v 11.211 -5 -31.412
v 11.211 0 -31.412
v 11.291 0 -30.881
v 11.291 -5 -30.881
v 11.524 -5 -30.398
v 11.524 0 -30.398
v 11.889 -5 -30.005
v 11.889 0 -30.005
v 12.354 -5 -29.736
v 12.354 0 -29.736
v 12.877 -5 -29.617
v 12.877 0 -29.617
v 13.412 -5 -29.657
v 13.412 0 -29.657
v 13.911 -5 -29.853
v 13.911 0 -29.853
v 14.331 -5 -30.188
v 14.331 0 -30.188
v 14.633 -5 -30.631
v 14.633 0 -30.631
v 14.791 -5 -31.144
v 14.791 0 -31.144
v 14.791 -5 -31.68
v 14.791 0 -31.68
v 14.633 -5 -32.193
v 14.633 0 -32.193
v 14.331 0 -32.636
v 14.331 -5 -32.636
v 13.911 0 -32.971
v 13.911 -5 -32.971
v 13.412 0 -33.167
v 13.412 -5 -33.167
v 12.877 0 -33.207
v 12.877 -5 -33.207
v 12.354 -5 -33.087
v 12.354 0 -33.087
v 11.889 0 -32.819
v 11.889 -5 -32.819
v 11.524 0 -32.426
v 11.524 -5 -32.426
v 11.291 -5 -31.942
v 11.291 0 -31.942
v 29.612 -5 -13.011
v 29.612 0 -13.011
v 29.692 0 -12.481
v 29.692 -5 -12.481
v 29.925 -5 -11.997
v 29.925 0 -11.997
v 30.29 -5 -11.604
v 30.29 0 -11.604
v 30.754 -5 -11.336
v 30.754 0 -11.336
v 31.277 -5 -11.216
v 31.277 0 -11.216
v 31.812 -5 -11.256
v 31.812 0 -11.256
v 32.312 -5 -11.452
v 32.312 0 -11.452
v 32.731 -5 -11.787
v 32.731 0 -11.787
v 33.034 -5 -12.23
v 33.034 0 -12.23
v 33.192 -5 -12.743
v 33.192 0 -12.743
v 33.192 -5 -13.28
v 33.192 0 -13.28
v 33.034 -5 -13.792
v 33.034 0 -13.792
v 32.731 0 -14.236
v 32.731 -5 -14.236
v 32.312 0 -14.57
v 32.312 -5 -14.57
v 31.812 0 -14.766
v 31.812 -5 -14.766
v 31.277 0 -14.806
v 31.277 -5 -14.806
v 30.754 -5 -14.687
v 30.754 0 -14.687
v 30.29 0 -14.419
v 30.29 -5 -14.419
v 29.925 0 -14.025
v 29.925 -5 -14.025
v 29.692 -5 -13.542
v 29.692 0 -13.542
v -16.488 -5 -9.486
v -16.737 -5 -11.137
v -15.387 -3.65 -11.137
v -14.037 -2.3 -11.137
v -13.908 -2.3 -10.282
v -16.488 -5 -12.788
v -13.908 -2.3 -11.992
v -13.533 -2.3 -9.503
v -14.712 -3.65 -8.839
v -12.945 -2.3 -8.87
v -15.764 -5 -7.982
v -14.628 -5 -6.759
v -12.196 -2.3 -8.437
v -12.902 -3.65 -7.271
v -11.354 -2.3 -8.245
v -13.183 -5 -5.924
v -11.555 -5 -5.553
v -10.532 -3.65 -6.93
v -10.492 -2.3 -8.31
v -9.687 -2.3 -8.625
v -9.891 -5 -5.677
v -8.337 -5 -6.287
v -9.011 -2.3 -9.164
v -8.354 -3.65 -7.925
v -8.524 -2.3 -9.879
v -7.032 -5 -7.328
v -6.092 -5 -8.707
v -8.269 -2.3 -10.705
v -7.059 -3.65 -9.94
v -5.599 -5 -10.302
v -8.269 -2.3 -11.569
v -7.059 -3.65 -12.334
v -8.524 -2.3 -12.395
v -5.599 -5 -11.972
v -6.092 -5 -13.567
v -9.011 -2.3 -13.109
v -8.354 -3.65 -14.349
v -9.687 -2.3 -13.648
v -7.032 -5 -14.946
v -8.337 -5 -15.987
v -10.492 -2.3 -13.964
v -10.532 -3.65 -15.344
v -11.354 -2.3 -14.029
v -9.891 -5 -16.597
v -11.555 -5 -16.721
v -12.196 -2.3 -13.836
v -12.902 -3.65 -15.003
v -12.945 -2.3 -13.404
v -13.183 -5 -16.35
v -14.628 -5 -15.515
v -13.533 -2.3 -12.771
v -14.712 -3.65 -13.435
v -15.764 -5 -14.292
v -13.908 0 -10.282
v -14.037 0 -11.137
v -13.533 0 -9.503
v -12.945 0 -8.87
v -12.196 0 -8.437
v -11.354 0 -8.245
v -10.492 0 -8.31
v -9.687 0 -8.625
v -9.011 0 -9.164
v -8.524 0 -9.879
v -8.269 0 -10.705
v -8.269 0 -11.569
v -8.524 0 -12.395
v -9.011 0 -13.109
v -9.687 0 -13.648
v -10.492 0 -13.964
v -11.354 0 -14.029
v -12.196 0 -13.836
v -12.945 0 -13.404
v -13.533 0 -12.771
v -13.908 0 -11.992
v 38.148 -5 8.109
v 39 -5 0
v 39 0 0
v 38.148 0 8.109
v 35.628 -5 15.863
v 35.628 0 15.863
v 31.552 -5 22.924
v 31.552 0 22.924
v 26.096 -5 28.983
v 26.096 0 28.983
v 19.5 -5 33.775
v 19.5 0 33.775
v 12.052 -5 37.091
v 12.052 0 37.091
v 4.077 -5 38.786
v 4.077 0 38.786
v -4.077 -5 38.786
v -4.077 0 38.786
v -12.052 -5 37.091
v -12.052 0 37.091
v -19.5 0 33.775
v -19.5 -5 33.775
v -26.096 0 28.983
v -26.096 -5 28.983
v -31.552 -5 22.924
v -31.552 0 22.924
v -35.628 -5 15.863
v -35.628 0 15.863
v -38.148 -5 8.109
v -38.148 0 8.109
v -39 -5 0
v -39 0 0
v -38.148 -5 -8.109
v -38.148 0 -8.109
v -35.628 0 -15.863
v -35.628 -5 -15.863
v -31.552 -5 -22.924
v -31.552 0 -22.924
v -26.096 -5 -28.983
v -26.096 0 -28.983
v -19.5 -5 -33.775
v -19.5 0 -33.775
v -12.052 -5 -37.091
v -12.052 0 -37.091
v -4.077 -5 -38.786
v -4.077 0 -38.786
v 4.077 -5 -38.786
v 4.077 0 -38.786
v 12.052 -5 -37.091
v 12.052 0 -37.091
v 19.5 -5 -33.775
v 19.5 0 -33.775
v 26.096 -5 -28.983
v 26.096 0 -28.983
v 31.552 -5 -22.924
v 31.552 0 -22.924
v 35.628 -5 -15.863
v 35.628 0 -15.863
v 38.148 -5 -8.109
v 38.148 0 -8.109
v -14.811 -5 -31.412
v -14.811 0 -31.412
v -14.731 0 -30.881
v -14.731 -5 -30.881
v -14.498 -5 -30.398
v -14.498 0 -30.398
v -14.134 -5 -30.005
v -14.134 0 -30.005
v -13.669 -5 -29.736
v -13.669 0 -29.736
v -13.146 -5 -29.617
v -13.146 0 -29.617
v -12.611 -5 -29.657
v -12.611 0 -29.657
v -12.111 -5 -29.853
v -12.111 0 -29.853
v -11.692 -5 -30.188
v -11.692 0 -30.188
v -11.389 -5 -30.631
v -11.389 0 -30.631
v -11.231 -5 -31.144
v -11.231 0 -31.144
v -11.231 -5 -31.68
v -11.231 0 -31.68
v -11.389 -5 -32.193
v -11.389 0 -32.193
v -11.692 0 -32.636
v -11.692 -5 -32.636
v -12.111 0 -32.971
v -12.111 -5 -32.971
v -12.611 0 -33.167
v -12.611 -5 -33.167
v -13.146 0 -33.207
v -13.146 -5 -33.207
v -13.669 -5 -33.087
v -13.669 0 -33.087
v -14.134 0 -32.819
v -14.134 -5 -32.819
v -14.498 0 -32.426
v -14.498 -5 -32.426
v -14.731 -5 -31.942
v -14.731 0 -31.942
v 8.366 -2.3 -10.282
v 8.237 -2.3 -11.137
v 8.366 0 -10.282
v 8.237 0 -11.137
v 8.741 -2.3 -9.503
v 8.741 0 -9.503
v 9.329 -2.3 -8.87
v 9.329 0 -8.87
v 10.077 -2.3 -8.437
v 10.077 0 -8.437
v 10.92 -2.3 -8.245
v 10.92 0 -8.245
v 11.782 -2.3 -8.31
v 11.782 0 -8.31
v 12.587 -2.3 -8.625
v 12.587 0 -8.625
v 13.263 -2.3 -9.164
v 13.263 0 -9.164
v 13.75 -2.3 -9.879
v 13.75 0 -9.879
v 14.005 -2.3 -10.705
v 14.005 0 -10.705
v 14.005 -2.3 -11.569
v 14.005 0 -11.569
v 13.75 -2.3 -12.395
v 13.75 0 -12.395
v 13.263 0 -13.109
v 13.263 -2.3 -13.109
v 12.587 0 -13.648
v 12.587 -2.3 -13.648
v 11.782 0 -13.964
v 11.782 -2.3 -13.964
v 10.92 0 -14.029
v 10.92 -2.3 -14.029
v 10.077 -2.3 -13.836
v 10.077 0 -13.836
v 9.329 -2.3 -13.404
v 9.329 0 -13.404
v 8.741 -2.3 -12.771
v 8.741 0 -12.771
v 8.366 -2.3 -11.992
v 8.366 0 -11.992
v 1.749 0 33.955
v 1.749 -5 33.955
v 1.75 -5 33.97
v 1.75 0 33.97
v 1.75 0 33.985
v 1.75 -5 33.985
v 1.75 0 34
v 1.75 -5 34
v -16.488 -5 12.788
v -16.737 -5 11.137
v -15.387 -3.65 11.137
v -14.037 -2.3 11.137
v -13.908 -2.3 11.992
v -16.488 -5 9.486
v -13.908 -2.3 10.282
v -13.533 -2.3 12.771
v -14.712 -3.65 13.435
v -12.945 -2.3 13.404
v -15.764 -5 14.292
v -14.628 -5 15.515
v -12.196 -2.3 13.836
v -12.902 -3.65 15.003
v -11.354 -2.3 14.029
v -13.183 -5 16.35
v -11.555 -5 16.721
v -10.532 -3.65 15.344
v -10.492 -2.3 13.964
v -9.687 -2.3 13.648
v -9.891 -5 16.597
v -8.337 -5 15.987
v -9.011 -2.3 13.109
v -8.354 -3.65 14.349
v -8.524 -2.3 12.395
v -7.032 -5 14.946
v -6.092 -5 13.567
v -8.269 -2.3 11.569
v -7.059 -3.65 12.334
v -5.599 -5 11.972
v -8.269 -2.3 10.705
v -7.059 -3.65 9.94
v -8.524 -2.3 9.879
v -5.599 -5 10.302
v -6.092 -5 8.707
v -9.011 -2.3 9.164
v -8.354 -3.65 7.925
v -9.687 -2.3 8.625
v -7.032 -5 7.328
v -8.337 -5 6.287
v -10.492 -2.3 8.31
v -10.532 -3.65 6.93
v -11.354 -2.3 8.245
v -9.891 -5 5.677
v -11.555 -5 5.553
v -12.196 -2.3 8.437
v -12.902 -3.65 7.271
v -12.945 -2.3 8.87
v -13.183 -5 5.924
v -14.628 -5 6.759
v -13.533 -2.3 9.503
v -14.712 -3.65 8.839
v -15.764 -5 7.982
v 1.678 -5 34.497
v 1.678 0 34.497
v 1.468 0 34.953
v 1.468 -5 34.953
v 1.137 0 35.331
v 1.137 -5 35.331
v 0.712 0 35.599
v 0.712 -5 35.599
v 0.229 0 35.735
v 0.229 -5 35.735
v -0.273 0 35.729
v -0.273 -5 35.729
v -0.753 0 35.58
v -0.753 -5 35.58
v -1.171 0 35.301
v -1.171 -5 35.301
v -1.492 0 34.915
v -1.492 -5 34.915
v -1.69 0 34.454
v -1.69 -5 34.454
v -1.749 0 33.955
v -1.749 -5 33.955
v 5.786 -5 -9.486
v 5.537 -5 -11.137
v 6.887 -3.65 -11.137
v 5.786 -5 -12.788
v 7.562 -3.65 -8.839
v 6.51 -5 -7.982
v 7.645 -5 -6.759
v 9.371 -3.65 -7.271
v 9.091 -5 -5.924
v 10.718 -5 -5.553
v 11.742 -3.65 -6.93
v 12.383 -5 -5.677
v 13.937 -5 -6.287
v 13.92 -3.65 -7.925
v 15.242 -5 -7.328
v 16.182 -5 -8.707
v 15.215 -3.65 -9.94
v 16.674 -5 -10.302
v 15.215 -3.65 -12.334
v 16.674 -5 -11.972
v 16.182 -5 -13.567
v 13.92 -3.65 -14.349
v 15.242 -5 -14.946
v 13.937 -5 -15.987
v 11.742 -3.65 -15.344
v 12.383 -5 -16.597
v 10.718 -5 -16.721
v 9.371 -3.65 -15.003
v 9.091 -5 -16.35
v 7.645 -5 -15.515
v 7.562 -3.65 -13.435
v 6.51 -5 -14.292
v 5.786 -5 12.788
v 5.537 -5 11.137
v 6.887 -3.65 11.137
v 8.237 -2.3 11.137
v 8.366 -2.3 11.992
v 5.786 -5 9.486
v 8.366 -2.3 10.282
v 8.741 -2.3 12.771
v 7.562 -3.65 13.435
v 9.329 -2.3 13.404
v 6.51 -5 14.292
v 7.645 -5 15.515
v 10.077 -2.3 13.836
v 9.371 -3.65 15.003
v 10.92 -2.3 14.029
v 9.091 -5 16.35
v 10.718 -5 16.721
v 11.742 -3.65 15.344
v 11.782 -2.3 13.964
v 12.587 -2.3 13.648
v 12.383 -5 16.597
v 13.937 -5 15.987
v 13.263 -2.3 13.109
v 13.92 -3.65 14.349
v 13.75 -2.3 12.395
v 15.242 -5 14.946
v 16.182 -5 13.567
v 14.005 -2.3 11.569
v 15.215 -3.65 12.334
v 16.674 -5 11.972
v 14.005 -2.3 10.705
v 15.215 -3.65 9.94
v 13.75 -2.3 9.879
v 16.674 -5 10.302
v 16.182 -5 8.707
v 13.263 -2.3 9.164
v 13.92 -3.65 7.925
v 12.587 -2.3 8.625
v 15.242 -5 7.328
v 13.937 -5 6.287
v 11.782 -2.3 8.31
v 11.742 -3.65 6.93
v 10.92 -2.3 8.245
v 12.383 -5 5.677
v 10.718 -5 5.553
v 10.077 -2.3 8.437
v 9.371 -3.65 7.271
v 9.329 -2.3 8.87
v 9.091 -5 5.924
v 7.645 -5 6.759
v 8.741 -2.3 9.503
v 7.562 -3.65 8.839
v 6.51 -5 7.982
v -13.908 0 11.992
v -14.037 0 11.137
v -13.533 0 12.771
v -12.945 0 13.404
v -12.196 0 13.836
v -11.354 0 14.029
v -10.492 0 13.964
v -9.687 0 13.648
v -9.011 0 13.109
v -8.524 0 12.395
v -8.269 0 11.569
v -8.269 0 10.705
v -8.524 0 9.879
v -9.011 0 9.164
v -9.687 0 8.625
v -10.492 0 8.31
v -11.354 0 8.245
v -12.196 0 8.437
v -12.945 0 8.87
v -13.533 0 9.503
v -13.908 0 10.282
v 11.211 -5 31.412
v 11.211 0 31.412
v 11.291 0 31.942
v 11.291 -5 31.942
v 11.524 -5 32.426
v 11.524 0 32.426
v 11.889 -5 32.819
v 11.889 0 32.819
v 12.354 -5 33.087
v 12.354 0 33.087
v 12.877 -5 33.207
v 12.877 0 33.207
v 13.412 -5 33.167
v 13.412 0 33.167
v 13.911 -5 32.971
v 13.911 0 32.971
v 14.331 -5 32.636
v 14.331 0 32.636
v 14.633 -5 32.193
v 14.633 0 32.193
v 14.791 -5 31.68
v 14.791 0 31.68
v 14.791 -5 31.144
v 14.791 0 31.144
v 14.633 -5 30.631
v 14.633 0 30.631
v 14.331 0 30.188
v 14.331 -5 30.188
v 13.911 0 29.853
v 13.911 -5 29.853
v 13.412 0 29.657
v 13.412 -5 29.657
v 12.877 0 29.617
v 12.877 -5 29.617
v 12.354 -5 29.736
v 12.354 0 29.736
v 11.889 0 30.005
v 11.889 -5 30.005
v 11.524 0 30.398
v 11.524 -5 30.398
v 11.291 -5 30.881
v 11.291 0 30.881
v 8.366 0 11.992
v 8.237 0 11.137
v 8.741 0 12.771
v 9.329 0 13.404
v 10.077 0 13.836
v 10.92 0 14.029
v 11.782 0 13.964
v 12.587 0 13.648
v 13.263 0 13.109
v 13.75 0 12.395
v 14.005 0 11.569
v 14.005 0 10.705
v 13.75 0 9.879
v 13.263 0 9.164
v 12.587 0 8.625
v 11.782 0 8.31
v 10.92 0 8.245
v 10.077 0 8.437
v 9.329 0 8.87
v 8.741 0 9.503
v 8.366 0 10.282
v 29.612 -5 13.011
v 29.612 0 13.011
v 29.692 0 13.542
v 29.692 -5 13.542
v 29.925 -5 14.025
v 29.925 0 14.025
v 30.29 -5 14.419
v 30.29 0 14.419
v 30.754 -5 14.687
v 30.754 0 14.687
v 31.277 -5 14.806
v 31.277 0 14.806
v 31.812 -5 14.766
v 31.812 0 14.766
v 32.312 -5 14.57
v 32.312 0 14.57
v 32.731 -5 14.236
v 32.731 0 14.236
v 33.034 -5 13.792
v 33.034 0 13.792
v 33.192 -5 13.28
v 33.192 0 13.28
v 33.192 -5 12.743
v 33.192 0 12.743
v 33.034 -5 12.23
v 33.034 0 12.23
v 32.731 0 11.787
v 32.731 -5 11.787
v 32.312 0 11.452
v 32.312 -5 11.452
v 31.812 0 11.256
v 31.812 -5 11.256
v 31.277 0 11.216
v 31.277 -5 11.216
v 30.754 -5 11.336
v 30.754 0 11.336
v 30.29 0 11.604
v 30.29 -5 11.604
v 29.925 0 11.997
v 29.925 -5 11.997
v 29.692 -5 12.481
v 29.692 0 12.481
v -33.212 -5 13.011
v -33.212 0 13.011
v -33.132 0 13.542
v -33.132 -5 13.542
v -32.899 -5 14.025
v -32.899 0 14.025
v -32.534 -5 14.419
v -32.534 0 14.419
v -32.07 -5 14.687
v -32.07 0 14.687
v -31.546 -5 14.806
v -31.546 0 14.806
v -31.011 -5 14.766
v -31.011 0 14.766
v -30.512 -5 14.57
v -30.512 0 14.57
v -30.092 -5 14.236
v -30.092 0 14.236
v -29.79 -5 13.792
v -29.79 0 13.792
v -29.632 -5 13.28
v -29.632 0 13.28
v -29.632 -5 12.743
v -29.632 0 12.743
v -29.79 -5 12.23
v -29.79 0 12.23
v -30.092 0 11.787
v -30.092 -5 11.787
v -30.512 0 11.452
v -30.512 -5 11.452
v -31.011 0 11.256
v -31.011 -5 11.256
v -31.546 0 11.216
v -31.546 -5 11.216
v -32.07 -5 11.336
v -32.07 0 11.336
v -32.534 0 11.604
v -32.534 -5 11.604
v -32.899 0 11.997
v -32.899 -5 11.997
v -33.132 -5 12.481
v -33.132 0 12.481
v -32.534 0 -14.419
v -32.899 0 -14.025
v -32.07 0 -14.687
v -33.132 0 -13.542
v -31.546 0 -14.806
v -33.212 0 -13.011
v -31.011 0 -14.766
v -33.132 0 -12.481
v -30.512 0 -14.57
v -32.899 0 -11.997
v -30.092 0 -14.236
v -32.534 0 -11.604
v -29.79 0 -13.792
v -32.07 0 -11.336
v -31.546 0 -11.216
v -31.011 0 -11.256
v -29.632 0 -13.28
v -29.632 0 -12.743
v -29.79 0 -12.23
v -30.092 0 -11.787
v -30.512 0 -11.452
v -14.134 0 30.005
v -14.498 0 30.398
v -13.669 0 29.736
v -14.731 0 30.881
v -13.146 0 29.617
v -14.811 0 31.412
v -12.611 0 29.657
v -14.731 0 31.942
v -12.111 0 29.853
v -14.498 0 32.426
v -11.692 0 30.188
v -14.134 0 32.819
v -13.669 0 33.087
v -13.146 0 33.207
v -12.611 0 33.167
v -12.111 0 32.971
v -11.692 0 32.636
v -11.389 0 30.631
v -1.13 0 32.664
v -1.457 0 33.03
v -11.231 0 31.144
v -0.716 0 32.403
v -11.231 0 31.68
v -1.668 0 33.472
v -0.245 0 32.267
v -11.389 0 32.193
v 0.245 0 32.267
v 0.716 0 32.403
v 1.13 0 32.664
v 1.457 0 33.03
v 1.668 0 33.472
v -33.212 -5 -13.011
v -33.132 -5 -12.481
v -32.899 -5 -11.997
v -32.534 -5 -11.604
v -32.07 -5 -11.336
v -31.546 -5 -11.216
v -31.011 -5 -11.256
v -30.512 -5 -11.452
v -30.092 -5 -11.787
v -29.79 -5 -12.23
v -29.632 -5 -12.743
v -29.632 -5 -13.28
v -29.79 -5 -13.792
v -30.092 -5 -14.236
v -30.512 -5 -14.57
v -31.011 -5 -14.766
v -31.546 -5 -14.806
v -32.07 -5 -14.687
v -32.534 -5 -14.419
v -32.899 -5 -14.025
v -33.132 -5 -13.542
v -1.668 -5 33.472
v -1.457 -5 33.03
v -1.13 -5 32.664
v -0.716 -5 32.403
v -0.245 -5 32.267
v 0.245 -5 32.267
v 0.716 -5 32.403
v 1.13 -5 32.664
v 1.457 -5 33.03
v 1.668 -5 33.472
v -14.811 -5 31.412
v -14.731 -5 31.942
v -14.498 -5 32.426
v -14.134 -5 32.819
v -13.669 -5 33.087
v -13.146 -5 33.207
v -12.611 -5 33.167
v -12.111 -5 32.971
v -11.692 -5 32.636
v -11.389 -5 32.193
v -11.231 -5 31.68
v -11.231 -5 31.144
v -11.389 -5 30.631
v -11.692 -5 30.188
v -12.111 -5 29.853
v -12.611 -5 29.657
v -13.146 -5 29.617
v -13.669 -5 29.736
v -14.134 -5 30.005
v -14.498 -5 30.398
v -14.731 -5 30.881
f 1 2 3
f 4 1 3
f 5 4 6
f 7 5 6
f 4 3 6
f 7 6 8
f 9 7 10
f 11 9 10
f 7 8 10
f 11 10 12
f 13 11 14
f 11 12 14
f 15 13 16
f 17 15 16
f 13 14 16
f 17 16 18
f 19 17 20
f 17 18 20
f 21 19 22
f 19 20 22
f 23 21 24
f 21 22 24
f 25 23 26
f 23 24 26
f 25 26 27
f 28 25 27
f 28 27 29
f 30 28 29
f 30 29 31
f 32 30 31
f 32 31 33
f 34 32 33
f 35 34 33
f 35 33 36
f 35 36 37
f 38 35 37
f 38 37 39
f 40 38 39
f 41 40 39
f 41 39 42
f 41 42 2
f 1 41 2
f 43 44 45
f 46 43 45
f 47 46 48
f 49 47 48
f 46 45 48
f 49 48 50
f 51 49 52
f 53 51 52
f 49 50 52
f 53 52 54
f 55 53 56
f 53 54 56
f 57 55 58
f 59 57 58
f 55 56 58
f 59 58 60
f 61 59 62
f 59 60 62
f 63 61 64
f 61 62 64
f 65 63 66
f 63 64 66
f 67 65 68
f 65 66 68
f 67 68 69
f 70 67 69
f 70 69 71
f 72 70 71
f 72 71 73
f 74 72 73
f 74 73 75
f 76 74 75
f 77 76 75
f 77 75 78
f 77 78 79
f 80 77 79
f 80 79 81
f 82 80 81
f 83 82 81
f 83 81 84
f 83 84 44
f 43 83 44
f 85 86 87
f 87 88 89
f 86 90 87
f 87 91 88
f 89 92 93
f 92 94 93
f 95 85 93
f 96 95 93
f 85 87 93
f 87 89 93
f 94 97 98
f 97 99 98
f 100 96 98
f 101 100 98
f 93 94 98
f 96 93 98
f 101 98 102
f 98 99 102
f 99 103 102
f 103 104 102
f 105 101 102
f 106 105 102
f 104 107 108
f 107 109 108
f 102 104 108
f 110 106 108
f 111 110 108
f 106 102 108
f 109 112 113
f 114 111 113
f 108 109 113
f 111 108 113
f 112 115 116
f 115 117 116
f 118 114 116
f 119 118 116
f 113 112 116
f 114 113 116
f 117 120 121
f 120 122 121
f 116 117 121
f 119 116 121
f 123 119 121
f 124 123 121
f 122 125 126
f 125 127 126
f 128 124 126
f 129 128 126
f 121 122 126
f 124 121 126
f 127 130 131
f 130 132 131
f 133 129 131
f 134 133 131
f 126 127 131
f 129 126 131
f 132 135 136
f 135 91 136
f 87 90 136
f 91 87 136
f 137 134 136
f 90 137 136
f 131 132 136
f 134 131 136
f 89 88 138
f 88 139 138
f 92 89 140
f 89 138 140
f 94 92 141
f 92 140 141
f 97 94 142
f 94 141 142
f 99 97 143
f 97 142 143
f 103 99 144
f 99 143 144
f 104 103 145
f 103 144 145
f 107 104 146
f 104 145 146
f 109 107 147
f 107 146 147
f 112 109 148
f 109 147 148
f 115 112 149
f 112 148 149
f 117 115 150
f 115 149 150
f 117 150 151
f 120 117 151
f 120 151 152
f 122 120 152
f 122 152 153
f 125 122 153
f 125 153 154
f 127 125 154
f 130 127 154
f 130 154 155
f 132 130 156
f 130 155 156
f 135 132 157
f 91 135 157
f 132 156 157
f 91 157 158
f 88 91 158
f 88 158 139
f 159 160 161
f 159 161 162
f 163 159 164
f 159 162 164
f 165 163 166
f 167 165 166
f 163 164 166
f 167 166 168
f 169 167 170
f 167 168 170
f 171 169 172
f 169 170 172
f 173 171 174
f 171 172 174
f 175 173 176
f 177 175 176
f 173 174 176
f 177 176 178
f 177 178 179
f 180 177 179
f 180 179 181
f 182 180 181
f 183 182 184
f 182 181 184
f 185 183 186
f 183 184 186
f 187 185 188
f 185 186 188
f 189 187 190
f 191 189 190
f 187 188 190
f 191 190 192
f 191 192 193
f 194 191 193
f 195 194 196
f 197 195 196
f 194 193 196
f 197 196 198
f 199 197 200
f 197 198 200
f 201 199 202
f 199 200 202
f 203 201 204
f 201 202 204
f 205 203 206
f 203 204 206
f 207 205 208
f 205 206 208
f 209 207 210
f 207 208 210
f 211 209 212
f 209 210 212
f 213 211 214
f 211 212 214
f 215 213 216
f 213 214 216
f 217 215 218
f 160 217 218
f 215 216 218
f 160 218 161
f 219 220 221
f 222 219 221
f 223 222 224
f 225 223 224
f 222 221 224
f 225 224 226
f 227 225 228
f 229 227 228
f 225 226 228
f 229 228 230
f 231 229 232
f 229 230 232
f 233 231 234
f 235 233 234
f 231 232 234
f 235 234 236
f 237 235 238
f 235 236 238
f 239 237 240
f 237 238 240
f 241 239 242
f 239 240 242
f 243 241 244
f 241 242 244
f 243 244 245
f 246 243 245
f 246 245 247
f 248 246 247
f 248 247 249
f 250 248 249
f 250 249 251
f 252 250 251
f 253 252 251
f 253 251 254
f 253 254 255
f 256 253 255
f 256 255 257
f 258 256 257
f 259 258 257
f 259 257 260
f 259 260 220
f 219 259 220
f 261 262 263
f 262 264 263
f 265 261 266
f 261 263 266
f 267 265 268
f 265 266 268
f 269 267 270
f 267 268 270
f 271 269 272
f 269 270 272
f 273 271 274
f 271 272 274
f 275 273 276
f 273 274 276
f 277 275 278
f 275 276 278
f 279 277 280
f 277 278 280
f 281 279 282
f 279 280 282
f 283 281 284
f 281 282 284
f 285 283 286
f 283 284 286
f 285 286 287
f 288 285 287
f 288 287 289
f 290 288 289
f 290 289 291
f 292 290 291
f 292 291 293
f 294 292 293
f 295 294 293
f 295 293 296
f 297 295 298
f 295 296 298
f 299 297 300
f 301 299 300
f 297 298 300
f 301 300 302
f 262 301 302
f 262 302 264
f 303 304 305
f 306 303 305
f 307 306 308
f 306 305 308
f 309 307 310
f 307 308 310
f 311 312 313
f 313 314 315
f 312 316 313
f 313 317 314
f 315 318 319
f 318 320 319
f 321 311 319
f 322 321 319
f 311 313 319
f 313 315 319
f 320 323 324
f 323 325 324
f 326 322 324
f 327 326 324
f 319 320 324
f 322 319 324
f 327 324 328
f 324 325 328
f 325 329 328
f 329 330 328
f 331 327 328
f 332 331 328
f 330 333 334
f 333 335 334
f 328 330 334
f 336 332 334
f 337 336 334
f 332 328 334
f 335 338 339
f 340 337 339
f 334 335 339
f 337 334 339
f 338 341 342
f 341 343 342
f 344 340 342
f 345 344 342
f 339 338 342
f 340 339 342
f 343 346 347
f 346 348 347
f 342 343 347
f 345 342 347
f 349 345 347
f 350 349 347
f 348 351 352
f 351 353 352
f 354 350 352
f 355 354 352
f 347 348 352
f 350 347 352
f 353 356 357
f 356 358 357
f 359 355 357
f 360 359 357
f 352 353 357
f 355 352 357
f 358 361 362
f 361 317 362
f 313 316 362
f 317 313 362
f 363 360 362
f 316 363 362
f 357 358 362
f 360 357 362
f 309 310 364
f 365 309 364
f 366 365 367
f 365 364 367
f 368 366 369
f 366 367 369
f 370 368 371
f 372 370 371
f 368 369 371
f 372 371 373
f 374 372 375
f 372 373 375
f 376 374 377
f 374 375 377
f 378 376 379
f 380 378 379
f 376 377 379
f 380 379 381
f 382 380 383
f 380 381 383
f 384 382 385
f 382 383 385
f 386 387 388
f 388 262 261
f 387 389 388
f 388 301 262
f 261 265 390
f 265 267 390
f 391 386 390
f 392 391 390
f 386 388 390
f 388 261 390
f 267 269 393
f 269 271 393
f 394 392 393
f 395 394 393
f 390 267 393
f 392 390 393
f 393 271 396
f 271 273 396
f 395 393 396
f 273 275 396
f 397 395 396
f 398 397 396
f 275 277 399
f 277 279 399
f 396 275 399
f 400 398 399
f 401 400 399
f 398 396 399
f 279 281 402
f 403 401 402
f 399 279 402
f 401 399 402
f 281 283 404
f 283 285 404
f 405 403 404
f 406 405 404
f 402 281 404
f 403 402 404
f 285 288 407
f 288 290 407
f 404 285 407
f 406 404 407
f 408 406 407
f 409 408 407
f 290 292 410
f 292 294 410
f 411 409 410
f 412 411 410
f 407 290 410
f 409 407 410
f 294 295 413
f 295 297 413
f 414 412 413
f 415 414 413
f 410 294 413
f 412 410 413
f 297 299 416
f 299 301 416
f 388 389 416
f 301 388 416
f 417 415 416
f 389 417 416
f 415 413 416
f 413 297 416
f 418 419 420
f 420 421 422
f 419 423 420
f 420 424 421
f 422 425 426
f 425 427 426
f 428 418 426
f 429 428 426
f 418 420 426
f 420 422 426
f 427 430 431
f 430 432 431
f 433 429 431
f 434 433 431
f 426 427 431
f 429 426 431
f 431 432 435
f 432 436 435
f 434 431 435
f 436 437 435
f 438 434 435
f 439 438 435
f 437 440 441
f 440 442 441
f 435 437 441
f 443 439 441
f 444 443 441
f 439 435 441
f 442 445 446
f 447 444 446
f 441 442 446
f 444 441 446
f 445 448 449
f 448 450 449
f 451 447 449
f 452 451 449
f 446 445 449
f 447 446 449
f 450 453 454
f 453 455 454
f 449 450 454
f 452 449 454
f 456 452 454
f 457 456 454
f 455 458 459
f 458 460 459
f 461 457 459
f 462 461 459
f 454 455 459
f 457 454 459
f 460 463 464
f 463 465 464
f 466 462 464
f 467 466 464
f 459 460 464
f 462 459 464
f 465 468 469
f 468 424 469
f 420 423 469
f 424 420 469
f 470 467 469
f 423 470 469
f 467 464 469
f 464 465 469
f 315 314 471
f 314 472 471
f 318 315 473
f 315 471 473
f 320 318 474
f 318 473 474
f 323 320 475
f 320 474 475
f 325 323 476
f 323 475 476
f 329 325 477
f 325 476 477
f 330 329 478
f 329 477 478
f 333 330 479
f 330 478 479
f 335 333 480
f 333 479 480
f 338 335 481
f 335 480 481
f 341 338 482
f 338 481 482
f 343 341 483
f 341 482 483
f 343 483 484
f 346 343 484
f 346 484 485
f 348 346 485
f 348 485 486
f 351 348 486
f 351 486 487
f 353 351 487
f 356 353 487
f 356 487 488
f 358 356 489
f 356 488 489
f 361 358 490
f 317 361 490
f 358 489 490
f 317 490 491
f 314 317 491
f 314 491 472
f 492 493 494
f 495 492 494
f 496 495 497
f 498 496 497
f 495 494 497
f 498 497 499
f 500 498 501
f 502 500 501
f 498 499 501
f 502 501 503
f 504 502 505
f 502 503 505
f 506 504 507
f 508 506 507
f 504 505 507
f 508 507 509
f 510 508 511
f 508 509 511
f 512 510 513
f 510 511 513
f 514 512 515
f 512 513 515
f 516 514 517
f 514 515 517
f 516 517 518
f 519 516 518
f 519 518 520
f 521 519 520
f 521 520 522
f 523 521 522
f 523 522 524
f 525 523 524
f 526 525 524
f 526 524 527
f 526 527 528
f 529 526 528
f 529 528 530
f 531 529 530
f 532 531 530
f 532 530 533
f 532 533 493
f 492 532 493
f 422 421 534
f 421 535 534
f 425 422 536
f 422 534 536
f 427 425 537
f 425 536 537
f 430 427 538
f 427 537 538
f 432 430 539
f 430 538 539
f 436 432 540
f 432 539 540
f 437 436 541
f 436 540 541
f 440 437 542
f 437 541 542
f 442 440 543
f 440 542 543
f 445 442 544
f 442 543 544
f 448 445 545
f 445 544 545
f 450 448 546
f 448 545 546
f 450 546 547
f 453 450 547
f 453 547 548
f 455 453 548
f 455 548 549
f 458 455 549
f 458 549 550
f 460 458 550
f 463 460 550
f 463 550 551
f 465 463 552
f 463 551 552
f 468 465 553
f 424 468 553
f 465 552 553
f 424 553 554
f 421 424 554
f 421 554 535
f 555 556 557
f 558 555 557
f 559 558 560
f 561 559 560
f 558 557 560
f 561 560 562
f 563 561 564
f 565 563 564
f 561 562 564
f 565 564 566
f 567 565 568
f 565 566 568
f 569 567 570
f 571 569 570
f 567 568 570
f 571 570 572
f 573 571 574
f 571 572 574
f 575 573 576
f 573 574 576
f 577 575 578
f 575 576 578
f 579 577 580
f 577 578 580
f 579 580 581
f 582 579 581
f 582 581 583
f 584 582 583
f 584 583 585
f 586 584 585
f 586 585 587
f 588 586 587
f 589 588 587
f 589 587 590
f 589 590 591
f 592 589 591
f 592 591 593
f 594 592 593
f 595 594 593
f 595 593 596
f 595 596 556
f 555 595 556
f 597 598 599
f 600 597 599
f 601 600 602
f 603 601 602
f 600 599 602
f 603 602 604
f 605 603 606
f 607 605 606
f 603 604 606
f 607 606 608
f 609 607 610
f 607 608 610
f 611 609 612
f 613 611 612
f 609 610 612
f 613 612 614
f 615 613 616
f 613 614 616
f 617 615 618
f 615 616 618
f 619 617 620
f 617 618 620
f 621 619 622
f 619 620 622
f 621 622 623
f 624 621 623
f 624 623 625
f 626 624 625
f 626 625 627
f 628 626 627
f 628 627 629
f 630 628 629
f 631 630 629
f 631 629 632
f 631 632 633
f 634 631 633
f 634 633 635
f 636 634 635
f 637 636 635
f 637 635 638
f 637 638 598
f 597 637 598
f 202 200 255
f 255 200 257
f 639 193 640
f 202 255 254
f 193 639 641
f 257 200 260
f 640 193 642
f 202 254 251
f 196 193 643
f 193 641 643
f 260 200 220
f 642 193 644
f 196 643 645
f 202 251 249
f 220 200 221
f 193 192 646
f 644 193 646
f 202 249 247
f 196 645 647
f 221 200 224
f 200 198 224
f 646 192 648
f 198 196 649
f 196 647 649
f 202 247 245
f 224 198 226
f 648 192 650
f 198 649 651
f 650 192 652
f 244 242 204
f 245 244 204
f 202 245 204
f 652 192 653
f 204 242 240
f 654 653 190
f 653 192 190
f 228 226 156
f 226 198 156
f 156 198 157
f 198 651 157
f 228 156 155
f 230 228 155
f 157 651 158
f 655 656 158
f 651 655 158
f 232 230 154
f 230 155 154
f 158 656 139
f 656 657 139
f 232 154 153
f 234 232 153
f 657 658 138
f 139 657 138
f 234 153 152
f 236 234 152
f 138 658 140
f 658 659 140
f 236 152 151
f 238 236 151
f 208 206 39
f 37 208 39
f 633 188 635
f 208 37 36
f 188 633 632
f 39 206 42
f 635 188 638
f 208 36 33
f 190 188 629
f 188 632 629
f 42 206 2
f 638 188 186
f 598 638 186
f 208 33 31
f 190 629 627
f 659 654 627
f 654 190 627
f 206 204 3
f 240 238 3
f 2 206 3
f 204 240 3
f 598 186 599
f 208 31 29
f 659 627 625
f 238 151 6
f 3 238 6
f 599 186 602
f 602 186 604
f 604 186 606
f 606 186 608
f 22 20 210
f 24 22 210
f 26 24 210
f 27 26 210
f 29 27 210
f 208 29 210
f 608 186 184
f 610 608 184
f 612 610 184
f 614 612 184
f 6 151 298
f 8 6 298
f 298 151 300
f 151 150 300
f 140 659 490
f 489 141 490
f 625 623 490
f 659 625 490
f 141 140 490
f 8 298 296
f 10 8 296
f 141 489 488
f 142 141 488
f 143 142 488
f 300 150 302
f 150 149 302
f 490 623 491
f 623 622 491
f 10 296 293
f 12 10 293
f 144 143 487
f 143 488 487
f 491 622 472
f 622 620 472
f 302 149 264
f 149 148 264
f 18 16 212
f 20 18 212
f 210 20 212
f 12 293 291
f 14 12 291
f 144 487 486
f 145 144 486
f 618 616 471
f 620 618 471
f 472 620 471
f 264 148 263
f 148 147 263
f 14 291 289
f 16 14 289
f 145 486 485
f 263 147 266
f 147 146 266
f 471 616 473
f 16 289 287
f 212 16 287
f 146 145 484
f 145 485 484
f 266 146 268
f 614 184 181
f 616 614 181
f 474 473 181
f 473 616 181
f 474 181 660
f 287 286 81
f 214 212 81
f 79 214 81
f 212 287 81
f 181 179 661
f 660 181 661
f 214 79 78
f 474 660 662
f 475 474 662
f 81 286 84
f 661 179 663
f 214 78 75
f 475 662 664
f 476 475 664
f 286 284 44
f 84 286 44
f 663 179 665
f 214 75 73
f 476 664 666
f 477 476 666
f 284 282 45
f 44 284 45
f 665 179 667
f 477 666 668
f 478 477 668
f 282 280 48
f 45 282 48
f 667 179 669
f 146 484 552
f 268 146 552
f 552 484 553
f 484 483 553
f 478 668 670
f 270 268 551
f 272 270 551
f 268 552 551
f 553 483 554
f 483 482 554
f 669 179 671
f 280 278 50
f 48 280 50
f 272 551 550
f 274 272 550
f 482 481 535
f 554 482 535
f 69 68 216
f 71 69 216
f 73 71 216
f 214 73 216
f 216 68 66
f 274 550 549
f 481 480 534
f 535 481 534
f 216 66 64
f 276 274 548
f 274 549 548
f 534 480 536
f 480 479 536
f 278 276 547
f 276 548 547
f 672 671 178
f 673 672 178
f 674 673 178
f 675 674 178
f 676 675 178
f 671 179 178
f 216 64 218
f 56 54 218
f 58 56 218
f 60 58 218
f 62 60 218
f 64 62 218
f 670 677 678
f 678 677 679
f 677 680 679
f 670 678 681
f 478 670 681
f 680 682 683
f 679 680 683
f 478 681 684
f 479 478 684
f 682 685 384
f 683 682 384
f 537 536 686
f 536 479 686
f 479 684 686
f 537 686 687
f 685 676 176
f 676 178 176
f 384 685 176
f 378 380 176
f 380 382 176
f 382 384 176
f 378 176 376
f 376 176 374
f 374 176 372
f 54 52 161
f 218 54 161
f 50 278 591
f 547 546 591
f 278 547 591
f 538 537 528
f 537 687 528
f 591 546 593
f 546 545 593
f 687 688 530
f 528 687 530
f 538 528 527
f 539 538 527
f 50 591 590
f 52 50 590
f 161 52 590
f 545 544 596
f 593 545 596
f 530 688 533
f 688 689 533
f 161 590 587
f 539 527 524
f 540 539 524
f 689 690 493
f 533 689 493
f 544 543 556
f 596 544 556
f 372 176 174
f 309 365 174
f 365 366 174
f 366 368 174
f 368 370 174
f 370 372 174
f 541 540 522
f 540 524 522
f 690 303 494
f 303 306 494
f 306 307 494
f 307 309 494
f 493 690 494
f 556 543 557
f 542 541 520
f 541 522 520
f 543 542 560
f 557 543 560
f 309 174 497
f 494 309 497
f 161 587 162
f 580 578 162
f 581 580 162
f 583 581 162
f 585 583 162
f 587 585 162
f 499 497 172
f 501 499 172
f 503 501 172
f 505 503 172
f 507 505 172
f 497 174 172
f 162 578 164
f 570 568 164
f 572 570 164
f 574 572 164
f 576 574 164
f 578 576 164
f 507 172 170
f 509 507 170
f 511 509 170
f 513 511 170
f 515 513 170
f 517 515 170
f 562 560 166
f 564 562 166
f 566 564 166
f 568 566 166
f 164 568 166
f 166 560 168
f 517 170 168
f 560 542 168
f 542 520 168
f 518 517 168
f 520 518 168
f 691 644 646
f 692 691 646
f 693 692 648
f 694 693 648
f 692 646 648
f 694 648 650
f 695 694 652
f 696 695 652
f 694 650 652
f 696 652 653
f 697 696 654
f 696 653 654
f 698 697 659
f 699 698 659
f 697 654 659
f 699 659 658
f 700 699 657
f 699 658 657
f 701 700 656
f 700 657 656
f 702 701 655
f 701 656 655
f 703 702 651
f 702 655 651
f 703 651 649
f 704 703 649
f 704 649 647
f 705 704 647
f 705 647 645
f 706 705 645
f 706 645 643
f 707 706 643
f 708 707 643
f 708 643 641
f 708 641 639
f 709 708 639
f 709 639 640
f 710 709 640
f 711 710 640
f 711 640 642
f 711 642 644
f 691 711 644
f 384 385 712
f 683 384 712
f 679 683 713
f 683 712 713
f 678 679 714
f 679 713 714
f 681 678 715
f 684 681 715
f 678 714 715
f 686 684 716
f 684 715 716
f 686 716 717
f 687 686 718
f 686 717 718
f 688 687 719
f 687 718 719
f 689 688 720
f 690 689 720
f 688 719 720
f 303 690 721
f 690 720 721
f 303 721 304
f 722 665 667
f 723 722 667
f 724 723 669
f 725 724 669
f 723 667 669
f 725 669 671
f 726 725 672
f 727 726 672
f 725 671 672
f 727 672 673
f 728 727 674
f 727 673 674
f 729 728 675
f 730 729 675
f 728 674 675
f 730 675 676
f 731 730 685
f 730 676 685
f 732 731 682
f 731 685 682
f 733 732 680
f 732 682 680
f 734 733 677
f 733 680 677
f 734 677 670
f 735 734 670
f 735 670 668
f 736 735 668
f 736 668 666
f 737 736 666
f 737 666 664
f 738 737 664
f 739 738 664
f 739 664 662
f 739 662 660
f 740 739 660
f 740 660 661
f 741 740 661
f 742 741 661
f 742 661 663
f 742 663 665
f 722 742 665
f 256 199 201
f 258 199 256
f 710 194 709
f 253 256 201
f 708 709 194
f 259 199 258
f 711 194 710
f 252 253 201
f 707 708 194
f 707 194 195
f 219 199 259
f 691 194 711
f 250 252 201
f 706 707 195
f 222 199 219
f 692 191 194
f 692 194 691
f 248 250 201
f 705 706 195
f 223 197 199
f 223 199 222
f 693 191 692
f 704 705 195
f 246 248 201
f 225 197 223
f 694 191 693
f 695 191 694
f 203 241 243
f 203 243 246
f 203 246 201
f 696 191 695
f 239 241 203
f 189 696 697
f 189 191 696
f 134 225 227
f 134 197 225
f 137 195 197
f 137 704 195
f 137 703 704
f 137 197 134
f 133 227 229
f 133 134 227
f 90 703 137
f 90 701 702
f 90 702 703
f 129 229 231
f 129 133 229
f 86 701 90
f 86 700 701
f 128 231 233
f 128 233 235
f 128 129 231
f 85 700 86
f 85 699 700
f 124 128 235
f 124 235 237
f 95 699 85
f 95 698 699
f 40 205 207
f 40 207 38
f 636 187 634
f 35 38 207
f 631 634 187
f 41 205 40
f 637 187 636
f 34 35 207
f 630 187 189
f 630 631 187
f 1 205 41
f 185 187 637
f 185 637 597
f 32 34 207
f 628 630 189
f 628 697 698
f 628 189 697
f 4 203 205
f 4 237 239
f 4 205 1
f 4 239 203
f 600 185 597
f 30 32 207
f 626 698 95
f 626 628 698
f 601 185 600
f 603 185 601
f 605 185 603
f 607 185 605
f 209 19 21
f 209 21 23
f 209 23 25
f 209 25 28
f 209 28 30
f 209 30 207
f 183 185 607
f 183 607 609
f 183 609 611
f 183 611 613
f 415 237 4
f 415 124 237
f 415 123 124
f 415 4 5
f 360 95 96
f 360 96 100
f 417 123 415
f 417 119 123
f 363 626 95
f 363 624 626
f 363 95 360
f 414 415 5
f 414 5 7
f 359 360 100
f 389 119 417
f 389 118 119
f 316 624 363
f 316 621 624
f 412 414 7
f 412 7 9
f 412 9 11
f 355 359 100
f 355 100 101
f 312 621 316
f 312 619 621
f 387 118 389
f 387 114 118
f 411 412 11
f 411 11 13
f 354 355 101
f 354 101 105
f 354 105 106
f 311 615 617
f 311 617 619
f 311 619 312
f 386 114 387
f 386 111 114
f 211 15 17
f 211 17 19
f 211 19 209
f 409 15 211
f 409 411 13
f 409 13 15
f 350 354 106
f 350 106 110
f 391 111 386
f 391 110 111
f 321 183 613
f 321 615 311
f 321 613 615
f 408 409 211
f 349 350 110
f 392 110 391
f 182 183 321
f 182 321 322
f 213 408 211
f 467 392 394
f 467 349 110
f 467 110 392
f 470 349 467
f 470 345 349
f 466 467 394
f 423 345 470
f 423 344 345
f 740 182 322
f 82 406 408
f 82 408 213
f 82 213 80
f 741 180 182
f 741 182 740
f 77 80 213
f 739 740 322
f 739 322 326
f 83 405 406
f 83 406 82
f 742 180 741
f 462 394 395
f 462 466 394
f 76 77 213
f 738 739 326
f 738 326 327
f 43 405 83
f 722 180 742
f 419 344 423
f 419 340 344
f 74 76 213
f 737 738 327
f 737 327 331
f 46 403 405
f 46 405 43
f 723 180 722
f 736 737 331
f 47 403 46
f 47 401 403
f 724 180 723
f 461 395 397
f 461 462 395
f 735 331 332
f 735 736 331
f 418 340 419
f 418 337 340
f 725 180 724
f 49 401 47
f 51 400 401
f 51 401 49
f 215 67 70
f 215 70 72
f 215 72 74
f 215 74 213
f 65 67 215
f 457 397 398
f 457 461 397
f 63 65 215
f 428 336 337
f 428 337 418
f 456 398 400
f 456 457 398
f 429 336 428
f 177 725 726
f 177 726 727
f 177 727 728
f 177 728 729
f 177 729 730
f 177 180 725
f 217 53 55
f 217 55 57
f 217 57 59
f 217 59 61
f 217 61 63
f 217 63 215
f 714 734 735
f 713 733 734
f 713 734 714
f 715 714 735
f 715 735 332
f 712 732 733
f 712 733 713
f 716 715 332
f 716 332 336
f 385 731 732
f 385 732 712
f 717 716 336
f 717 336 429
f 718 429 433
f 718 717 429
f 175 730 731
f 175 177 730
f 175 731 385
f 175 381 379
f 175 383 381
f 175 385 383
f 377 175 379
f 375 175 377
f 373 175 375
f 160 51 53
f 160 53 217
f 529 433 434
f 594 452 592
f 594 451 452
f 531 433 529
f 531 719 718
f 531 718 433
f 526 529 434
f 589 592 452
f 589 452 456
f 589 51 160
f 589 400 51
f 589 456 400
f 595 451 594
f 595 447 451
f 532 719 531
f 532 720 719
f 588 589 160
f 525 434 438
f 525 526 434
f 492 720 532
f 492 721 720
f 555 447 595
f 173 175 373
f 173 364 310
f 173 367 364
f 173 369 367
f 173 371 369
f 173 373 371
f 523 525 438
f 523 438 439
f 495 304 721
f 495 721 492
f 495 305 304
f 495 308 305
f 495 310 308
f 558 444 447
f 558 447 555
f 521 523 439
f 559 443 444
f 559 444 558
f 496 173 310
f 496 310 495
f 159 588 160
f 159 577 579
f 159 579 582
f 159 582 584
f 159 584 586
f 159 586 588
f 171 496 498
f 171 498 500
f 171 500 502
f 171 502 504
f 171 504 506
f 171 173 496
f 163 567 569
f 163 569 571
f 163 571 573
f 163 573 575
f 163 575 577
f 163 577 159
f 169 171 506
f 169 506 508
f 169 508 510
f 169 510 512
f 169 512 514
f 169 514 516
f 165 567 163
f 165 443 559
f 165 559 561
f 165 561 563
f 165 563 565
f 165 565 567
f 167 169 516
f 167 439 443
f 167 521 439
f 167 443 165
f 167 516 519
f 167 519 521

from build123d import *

# Parameters (mm, degrees)
F0_R           = 39
F1_DEPTH       = 5
F3_D           = 3.6
F5_D           = 5.8
F5_CSINK_D     = 11.2
F5_CSINK_ANGLE = 90
F6_DEPTH       = 25


with BuildPart() as f1:
    # F0 (on Front) → F1 (new body)
    with BuildSketch(Plane.XZ):
        Circle(F0_R)
    extrude(amount=F1_DEPTH)

    # F3 (through all)
    with Locations(Plane.XZ.offset(5)):
        with Locations((31.4119041054, 13.0112367004), (13.0112367004, 31.4119041054), (-13.0112367004, 31.4119041054), (-31.4119041054, 13.0112367004), (-31.4119041054, -13.0112367004), (-13.0112367004, -31.4119041054), (13.0112367004, -31.4119041054), (31.4119041054, -13.0112367004)):
            Hole(F3_D / 2)

    # F5 (through all)
    with Locations(Plane.XZ.offset(5)):
        with Locations((11.1369318037, 11.1369318037), (-11.1369318037, 11.1369318037), (-11.1369318037, -11.1369318037), (11.1369318037, -11.1369318037)):
            CounterSinkHole(F5_D / 2, F5_CSINK_D / 2, counter_sink_angle=F5_CSINK_ANGLE)

    # F2 (on face) → F6 (cut)
    with BuildSketch(Plane.XZ.offset(5)):
        with BuildLine():
            ThreePointArc((-1.7494203868, 33.9549632353), (0, 32.25), (1.7494203868, 33.9549632353))
            ThreePointArc((1.7494203868, 33.9549632353), (0, 34), (-1.7494203868, 33.9549632353))
        make_face()
        with BuildLine():
            ThreePointArc((-1.7494203868, 33.9549632353), (0, 34), (1.7494203868, 33.9549632353))
            ThreePointArc((1.7494203868, 33.9549632353), (1.7498550907, 33.9774797529), (1.75, 34))
            ThreePointArc((1.75, 34), (-0.0225202471, 35.7498550907), (-1.7494203868, 33.9549632353))
        make_face()
    extrude(amount=-F6_DEPTH, mode=Mode.SUBTRACT)


solid = f1.part
